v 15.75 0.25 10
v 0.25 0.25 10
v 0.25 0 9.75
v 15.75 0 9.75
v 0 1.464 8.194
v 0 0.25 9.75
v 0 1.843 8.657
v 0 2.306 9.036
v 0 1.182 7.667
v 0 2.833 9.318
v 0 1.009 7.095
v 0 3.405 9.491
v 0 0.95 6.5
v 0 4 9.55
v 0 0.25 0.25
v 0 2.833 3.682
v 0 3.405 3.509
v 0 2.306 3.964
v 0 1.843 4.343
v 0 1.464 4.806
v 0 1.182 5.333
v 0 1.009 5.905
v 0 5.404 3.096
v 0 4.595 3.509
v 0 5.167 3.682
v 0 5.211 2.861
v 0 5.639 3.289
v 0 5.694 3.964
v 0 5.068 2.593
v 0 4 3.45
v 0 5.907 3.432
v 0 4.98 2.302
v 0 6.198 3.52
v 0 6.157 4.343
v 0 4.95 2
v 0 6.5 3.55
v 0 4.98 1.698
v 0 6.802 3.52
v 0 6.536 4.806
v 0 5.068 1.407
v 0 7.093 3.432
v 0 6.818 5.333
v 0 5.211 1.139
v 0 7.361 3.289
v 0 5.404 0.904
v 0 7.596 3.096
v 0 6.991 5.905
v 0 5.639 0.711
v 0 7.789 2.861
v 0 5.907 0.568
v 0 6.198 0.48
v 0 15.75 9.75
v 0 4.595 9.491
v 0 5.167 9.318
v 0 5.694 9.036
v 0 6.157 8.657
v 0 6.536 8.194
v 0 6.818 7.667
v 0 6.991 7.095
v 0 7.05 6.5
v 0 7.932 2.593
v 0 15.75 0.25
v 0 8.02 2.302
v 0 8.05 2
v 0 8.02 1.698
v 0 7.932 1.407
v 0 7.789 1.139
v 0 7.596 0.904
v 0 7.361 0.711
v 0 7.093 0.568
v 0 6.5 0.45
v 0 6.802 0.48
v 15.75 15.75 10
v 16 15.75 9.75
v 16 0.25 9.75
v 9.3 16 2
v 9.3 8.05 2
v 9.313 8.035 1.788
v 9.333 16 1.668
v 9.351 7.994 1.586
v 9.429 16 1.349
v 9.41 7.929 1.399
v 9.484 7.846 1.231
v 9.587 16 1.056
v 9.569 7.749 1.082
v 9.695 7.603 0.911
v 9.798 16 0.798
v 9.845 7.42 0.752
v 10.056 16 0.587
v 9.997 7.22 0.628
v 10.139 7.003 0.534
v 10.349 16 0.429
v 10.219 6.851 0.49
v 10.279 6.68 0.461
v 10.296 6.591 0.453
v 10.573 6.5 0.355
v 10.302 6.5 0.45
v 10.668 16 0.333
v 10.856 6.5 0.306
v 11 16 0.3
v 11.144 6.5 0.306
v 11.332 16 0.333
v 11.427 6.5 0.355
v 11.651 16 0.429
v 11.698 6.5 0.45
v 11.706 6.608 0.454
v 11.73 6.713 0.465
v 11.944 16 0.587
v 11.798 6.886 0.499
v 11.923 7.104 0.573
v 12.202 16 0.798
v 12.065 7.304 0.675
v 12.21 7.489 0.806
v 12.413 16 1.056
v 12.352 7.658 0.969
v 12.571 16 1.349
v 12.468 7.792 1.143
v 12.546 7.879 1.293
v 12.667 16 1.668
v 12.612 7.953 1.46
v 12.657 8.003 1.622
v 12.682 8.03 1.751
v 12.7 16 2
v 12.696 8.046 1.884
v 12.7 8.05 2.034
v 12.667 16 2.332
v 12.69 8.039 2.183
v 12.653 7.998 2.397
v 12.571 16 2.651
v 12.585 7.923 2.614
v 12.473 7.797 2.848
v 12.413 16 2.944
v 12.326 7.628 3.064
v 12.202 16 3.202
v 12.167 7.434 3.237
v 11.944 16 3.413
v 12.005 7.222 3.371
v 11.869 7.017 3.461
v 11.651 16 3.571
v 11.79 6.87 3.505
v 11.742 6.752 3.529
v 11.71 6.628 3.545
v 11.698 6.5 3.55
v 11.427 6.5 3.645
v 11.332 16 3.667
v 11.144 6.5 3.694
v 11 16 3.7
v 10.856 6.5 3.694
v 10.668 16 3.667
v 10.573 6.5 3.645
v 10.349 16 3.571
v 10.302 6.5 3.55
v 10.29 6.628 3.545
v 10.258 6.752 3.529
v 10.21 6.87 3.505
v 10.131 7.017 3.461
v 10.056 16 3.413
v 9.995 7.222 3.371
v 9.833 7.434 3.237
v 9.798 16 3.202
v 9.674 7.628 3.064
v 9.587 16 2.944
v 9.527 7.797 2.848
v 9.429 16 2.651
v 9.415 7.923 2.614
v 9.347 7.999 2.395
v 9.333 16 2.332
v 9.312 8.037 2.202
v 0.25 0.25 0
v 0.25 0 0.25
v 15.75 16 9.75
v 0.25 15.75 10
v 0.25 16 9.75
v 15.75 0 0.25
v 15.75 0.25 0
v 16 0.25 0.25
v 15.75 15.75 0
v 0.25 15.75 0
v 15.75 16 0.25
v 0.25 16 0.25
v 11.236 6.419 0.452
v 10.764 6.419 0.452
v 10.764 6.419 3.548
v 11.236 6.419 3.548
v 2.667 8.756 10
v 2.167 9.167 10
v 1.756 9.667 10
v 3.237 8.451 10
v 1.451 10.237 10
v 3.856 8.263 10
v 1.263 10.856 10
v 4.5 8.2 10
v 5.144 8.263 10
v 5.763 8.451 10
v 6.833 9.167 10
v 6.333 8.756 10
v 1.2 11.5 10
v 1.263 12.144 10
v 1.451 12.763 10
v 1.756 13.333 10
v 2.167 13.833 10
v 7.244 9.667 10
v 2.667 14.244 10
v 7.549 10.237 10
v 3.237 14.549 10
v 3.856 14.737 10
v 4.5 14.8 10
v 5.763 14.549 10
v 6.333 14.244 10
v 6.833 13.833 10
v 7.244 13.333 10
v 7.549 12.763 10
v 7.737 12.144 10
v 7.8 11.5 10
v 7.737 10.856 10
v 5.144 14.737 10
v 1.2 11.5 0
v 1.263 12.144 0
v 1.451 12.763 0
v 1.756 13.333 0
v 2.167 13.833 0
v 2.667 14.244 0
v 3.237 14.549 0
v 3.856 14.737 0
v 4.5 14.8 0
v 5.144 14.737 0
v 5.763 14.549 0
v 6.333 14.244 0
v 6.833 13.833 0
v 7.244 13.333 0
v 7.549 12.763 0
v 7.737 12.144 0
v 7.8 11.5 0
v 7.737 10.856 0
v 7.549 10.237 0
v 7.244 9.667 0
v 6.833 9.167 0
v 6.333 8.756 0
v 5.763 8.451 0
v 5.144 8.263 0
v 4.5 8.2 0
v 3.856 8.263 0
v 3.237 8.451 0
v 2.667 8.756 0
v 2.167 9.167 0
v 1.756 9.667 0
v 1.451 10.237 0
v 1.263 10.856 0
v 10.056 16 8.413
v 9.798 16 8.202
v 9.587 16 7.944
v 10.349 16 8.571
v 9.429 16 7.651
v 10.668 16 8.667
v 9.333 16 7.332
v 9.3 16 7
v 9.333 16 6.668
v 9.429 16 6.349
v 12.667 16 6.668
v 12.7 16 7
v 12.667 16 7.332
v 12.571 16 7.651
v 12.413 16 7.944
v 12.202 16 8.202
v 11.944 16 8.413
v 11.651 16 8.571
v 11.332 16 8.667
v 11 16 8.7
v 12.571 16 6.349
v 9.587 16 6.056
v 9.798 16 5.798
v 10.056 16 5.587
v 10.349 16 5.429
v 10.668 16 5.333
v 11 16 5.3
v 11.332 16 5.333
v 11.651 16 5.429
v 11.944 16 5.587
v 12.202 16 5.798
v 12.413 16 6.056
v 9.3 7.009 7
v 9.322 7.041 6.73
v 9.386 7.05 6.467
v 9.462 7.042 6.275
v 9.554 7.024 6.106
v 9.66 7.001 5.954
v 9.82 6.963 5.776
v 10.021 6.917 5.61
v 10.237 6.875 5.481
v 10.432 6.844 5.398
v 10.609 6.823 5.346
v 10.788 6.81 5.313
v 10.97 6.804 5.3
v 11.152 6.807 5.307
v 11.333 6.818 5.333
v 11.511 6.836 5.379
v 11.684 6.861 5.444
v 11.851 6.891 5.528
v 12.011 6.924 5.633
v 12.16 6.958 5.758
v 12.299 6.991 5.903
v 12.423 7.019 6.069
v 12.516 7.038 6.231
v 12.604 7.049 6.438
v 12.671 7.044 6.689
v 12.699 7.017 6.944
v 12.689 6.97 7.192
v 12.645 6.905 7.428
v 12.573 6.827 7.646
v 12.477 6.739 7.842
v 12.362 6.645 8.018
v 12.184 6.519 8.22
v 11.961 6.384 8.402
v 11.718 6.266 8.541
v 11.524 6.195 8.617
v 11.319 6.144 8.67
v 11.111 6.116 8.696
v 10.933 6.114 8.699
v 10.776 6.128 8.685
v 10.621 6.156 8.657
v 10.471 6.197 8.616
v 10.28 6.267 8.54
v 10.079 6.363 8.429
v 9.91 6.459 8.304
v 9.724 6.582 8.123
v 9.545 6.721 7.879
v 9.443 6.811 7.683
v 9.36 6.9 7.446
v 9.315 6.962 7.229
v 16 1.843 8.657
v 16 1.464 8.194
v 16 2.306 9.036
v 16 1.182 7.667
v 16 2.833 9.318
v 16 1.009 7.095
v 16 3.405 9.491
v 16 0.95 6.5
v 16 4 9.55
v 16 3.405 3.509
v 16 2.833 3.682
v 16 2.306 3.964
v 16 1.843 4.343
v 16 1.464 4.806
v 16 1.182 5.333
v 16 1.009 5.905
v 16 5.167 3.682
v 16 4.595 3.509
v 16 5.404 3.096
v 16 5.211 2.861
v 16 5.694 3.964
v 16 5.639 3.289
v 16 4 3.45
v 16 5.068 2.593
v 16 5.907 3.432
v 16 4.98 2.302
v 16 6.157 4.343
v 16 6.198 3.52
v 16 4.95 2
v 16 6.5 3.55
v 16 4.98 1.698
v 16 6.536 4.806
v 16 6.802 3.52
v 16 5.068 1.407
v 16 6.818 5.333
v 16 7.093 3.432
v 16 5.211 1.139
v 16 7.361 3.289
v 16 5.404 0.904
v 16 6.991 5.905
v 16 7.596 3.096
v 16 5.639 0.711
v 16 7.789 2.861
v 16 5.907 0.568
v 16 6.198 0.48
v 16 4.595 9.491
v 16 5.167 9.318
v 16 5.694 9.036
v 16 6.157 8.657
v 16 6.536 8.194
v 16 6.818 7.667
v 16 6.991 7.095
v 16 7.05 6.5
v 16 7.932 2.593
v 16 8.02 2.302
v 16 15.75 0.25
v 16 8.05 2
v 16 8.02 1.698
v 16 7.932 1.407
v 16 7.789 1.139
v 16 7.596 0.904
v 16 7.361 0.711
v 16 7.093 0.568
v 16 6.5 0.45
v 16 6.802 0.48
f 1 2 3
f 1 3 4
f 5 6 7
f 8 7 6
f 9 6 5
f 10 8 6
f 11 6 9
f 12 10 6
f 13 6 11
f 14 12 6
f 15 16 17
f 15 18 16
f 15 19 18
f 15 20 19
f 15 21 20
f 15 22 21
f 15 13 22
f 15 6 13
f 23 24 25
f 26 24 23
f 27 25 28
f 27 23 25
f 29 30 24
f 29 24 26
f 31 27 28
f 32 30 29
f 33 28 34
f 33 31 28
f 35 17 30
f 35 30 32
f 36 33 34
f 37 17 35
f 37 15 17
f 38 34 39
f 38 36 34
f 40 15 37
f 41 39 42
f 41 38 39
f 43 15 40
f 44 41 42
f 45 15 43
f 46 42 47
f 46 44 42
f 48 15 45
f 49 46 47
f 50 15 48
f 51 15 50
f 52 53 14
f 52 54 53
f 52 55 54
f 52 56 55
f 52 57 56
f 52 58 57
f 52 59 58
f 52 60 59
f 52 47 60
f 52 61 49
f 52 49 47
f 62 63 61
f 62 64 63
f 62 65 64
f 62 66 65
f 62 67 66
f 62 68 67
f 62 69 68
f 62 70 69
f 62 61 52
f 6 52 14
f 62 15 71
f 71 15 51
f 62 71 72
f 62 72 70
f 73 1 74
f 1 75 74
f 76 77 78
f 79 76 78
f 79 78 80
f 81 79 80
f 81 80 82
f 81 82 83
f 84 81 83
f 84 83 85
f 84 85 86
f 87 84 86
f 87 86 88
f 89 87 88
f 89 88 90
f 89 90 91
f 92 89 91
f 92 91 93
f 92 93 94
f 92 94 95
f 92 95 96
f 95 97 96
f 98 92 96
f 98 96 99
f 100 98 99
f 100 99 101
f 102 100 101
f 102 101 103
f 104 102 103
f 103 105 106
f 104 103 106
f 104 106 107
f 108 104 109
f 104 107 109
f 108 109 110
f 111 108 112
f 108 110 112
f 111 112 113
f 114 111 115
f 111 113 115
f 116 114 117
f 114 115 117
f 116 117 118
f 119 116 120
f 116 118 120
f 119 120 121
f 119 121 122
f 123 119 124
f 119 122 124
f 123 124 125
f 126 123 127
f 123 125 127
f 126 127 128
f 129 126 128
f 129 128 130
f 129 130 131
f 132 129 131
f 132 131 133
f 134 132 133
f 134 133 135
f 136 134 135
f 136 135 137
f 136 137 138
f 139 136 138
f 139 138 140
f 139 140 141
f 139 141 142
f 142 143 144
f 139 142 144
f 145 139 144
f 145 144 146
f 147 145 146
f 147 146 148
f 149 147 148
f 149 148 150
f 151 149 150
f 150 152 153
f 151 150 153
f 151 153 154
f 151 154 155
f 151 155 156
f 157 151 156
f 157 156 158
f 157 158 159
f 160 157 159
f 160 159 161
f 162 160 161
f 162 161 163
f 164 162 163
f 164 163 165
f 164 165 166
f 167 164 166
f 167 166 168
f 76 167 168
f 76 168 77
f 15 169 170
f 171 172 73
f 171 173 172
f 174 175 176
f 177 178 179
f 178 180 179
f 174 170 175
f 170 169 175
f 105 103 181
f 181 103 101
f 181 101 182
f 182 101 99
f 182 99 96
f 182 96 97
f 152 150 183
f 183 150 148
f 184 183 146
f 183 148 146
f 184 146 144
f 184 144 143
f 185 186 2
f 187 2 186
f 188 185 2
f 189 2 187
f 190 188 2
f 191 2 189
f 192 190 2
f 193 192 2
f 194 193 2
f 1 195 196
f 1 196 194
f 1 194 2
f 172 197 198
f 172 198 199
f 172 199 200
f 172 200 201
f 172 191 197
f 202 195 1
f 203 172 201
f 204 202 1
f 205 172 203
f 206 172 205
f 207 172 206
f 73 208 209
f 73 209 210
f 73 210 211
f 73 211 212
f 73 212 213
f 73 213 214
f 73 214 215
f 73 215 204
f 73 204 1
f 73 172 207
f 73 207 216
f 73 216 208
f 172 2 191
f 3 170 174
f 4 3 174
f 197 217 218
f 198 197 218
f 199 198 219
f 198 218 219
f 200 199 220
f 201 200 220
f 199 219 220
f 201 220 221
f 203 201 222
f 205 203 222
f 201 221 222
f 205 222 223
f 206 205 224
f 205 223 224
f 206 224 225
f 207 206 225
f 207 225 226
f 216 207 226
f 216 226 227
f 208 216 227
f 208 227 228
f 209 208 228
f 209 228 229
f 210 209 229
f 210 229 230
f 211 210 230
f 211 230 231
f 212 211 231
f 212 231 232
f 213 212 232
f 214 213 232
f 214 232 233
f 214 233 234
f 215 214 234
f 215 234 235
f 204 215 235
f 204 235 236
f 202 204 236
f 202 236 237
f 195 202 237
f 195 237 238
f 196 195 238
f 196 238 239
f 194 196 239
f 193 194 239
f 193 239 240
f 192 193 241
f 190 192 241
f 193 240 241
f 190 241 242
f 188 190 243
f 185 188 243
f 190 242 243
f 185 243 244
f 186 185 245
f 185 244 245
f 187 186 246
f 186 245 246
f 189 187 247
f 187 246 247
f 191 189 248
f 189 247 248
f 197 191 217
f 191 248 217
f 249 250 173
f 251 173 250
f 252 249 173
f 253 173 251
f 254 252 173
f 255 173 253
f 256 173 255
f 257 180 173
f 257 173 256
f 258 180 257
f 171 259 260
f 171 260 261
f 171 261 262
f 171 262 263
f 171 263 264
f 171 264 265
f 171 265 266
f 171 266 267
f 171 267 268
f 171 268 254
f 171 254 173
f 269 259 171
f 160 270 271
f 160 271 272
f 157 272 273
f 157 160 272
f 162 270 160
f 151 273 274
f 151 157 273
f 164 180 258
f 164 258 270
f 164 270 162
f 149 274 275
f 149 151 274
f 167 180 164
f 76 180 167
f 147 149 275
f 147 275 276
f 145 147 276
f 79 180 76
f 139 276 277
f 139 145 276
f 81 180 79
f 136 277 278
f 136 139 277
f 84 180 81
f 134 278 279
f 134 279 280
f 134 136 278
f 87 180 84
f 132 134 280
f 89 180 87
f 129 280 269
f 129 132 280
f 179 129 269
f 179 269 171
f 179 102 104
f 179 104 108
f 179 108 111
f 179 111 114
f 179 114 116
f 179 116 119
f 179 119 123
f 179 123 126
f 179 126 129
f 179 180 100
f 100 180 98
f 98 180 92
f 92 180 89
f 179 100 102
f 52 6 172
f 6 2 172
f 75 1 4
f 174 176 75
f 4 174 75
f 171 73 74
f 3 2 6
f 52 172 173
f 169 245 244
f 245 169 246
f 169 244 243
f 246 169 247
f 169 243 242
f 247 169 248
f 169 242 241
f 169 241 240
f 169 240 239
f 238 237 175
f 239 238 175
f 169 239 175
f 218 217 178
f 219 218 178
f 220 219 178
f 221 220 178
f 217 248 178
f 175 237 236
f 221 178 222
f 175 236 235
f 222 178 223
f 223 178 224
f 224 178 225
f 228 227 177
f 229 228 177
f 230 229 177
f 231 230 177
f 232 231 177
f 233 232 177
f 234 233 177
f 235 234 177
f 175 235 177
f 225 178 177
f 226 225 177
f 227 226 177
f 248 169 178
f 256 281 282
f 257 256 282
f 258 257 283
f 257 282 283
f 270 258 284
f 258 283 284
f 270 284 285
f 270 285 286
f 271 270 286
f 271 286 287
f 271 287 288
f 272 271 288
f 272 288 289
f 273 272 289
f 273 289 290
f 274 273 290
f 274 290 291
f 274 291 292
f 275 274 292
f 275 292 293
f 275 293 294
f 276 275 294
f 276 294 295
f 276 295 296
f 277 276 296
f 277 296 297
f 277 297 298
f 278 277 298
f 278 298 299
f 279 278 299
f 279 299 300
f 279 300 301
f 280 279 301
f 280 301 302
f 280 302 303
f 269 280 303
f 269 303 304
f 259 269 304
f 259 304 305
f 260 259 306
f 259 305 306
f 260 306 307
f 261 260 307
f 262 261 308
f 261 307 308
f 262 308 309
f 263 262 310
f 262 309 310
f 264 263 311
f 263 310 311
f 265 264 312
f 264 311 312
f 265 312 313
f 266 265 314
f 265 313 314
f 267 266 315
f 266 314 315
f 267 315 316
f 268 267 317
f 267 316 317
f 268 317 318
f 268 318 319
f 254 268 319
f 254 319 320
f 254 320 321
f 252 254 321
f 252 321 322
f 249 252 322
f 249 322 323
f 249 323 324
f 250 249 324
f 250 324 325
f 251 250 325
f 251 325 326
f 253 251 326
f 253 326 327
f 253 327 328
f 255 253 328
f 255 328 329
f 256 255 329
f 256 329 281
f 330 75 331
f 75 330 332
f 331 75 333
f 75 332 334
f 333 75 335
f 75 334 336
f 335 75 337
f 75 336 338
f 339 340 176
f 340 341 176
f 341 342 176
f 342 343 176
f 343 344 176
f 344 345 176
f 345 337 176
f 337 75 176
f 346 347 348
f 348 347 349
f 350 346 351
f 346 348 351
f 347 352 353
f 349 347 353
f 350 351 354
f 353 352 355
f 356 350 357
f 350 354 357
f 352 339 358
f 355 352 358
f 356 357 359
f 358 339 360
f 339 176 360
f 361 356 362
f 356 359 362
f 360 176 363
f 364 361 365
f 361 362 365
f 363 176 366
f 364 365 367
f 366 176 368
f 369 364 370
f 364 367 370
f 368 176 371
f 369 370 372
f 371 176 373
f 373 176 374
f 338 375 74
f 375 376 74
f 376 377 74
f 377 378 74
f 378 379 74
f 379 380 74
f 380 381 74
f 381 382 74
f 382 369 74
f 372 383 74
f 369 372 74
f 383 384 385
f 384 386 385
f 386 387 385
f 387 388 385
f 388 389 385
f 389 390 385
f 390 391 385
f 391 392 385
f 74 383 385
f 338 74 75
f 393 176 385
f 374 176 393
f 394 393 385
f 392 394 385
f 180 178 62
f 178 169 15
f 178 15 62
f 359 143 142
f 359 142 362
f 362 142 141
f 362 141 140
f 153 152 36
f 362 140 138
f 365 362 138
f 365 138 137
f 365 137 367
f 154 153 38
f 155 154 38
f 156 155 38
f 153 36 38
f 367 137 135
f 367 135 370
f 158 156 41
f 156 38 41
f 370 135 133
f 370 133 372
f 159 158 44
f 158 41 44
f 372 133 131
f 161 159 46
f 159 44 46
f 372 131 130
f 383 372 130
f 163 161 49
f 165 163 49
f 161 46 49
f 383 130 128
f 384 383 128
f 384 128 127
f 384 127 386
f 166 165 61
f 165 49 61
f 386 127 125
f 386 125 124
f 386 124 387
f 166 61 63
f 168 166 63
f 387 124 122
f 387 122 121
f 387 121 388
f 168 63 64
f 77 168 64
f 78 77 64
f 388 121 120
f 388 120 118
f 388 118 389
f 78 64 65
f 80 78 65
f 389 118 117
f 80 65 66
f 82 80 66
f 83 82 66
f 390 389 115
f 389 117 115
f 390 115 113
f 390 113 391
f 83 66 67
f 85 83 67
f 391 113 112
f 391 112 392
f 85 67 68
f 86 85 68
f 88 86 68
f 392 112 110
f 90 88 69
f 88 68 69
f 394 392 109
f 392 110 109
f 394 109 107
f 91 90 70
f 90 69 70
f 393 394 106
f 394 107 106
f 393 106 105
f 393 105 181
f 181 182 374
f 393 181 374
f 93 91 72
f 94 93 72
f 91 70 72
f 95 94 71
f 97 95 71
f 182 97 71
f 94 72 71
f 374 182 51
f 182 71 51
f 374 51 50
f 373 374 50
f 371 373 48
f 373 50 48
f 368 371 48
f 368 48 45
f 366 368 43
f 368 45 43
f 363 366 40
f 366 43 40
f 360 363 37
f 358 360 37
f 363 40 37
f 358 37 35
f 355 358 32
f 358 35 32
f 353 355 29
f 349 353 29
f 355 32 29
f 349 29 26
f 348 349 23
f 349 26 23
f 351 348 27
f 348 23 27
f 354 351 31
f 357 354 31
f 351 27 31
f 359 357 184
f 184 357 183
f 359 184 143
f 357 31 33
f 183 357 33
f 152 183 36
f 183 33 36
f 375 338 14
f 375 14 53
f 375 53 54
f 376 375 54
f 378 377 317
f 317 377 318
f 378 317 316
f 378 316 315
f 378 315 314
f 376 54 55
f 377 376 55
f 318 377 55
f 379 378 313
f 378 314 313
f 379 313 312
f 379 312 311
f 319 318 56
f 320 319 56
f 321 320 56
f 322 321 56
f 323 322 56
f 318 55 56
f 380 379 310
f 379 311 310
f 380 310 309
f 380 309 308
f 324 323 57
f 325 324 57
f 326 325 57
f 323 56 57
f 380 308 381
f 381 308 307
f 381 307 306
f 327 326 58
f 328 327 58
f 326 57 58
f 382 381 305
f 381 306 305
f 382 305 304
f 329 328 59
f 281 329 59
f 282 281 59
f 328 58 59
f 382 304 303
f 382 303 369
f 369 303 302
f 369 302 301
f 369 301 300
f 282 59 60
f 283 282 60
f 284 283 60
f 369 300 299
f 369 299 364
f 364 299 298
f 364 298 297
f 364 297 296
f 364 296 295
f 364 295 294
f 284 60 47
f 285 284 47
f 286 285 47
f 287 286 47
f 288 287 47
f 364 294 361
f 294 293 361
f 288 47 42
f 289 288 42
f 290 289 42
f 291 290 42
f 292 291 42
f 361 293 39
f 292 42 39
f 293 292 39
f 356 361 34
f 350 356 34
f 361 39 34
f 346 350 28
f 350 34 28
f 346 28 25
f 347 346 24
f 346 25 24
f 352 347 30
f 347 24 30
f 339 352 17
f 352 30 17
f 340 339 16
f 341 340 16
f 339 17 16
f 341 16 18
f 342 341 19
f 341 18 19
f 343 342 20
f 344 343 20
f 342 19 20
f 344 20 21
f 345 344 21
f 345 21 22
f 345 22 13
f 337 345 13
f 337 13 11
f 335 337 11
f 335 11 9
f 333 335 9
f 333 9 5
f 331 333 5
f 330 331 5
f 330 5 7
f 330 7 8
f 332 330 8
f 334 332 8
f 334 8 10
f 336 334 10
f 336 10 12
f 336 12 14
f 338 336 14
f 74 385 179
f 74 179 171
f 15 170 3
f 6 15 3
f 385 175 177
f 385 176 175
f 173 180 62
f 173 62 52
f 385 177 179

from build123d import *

# Parameters (mm, degrees)
ESQUISSE1_W                     = 16
ESQUISSE1_H                     = 16
BOSS_EXTRU_1_DEPTH              = 10
D_GAGEMENT_M61_D                = 6.6
DIAM_TRE_DU_PER_AGE_6_1_6_1_1_D = 6.1
DIAM_TRE_DU_PER_AGE_3_1_3_1_1_D = 3.1
D_GAGEMENT_M31_D                = 3.4
D_GAGEMENT_M31_DEPTH            = 11
D_GAGEMENT_M31_TIP              = 1.021463052
D_GAGEMENT_M33_D                = 3.4
D_GAGEMENT_M33_DEPTH            = 9.5
D_GAGEMENT_M33_TIP              = 1.021463052
CHANFREIN1_SIZE                 = 0.25


with BuildPart() as part:
    # Esquisse1 → Boss.-Extru.1 (new body)
    with BuildSketch(Plane.XY):
        with Locations((8, 8)):
            Rectangle(ESQUISSE1_W, ESQUISSE1_H)
    extrude(amount=BOSS_EXTRU_1_DEPTH)

    # Dégagement M61 (through all)
    with Locations(Plane.XY.offset(10)):
        with Locations((4.5, 11.5)):
            Hole(D_GAGEMENT_M61_D / 2)

    # Diamètre du perçage Ø6.1 (6.1)1 (through all)
    with Locations(Plane(origin=(16, 0, 0), x_dir=(0, 0, -1), z_dir=(1, 0, 0))):
        with Locations((-6.5, 4)):
            Hole(DIAM_TRE_DU_PER_AGE_6_1_6_1_1_D / 2)

    # Diamètre du perçage Ø3.1 (3.1)1 (through all)
    with Locations(Plane(origin=(16, 0, 0), x_dir=(0, 0, -1), z_dir=(1, 0, 0))):
        with Locations((-2, 6.5)):
            Hole(DIAM_TRE_DU_PER_AGE_3_1_3_1_1_D / 2)

    # Dégagement M31
    with Locations(Plane(origin=(0, 16, 0), x_dir=(1, 0, 0), z_dir=(0, 1, 0))):
        with Locations((11, -7)):
            Hole(D_GAGEMENT_M31_D / 2, depth=D_GAGEMENT_M31_DEPTH)
            with Locations((0, 0, -(D_GAGEMENT_M31_DEPTH + D_GAGEMENT_M31_TIP / 2))):  # 118° drill point
                Cone(0, D_GAGEMENT_M31_D / 2, D_GAGEMENT_M31_TIP, mode=Mode.SUBTRACT)

    # Dégagement M33
    with Locations(Plane(origin=(0, 16, 0), x_dir=(1, 0, 0), z_dir=(0, 1, 0))):
        with Locations((11, -2)):
            Hole(D_GAGEMENT_M33_D / 2, depth=D_GAGEMENT_M33_DEPTH)
            with Locations((0, 0, -(D_GAGEMENT_M33_DEPTH + D_GAGEMENT_M33_TIP / 2))):  # 118° drill point
                Cone(0, D_GAGEMENT_M33_D / 2, D_GAGEMENT_M33_TIP, mode=Mode.SUBTRACT)

    # Chanfrein1
    chanfrein1_edges = [part.edges().sort_by_distance(p)[0] for p in [
        (16, 8, 10),
        (8, 16, 10),
        (0, 8, 10),
        (8, 16, 0),
        (16, 8, 0),
        (8, 0, 0),
        (0, 8, 0),
        (8, 0, 10),
        (0, 16, 5),
        (16, 16, 5),
        (16, 0, 5),
        (0, 0, 5),
    ]]
    chamfer(chanfrein1_edges, length=CHANFREIN1_SIZE)


solid = part.part
